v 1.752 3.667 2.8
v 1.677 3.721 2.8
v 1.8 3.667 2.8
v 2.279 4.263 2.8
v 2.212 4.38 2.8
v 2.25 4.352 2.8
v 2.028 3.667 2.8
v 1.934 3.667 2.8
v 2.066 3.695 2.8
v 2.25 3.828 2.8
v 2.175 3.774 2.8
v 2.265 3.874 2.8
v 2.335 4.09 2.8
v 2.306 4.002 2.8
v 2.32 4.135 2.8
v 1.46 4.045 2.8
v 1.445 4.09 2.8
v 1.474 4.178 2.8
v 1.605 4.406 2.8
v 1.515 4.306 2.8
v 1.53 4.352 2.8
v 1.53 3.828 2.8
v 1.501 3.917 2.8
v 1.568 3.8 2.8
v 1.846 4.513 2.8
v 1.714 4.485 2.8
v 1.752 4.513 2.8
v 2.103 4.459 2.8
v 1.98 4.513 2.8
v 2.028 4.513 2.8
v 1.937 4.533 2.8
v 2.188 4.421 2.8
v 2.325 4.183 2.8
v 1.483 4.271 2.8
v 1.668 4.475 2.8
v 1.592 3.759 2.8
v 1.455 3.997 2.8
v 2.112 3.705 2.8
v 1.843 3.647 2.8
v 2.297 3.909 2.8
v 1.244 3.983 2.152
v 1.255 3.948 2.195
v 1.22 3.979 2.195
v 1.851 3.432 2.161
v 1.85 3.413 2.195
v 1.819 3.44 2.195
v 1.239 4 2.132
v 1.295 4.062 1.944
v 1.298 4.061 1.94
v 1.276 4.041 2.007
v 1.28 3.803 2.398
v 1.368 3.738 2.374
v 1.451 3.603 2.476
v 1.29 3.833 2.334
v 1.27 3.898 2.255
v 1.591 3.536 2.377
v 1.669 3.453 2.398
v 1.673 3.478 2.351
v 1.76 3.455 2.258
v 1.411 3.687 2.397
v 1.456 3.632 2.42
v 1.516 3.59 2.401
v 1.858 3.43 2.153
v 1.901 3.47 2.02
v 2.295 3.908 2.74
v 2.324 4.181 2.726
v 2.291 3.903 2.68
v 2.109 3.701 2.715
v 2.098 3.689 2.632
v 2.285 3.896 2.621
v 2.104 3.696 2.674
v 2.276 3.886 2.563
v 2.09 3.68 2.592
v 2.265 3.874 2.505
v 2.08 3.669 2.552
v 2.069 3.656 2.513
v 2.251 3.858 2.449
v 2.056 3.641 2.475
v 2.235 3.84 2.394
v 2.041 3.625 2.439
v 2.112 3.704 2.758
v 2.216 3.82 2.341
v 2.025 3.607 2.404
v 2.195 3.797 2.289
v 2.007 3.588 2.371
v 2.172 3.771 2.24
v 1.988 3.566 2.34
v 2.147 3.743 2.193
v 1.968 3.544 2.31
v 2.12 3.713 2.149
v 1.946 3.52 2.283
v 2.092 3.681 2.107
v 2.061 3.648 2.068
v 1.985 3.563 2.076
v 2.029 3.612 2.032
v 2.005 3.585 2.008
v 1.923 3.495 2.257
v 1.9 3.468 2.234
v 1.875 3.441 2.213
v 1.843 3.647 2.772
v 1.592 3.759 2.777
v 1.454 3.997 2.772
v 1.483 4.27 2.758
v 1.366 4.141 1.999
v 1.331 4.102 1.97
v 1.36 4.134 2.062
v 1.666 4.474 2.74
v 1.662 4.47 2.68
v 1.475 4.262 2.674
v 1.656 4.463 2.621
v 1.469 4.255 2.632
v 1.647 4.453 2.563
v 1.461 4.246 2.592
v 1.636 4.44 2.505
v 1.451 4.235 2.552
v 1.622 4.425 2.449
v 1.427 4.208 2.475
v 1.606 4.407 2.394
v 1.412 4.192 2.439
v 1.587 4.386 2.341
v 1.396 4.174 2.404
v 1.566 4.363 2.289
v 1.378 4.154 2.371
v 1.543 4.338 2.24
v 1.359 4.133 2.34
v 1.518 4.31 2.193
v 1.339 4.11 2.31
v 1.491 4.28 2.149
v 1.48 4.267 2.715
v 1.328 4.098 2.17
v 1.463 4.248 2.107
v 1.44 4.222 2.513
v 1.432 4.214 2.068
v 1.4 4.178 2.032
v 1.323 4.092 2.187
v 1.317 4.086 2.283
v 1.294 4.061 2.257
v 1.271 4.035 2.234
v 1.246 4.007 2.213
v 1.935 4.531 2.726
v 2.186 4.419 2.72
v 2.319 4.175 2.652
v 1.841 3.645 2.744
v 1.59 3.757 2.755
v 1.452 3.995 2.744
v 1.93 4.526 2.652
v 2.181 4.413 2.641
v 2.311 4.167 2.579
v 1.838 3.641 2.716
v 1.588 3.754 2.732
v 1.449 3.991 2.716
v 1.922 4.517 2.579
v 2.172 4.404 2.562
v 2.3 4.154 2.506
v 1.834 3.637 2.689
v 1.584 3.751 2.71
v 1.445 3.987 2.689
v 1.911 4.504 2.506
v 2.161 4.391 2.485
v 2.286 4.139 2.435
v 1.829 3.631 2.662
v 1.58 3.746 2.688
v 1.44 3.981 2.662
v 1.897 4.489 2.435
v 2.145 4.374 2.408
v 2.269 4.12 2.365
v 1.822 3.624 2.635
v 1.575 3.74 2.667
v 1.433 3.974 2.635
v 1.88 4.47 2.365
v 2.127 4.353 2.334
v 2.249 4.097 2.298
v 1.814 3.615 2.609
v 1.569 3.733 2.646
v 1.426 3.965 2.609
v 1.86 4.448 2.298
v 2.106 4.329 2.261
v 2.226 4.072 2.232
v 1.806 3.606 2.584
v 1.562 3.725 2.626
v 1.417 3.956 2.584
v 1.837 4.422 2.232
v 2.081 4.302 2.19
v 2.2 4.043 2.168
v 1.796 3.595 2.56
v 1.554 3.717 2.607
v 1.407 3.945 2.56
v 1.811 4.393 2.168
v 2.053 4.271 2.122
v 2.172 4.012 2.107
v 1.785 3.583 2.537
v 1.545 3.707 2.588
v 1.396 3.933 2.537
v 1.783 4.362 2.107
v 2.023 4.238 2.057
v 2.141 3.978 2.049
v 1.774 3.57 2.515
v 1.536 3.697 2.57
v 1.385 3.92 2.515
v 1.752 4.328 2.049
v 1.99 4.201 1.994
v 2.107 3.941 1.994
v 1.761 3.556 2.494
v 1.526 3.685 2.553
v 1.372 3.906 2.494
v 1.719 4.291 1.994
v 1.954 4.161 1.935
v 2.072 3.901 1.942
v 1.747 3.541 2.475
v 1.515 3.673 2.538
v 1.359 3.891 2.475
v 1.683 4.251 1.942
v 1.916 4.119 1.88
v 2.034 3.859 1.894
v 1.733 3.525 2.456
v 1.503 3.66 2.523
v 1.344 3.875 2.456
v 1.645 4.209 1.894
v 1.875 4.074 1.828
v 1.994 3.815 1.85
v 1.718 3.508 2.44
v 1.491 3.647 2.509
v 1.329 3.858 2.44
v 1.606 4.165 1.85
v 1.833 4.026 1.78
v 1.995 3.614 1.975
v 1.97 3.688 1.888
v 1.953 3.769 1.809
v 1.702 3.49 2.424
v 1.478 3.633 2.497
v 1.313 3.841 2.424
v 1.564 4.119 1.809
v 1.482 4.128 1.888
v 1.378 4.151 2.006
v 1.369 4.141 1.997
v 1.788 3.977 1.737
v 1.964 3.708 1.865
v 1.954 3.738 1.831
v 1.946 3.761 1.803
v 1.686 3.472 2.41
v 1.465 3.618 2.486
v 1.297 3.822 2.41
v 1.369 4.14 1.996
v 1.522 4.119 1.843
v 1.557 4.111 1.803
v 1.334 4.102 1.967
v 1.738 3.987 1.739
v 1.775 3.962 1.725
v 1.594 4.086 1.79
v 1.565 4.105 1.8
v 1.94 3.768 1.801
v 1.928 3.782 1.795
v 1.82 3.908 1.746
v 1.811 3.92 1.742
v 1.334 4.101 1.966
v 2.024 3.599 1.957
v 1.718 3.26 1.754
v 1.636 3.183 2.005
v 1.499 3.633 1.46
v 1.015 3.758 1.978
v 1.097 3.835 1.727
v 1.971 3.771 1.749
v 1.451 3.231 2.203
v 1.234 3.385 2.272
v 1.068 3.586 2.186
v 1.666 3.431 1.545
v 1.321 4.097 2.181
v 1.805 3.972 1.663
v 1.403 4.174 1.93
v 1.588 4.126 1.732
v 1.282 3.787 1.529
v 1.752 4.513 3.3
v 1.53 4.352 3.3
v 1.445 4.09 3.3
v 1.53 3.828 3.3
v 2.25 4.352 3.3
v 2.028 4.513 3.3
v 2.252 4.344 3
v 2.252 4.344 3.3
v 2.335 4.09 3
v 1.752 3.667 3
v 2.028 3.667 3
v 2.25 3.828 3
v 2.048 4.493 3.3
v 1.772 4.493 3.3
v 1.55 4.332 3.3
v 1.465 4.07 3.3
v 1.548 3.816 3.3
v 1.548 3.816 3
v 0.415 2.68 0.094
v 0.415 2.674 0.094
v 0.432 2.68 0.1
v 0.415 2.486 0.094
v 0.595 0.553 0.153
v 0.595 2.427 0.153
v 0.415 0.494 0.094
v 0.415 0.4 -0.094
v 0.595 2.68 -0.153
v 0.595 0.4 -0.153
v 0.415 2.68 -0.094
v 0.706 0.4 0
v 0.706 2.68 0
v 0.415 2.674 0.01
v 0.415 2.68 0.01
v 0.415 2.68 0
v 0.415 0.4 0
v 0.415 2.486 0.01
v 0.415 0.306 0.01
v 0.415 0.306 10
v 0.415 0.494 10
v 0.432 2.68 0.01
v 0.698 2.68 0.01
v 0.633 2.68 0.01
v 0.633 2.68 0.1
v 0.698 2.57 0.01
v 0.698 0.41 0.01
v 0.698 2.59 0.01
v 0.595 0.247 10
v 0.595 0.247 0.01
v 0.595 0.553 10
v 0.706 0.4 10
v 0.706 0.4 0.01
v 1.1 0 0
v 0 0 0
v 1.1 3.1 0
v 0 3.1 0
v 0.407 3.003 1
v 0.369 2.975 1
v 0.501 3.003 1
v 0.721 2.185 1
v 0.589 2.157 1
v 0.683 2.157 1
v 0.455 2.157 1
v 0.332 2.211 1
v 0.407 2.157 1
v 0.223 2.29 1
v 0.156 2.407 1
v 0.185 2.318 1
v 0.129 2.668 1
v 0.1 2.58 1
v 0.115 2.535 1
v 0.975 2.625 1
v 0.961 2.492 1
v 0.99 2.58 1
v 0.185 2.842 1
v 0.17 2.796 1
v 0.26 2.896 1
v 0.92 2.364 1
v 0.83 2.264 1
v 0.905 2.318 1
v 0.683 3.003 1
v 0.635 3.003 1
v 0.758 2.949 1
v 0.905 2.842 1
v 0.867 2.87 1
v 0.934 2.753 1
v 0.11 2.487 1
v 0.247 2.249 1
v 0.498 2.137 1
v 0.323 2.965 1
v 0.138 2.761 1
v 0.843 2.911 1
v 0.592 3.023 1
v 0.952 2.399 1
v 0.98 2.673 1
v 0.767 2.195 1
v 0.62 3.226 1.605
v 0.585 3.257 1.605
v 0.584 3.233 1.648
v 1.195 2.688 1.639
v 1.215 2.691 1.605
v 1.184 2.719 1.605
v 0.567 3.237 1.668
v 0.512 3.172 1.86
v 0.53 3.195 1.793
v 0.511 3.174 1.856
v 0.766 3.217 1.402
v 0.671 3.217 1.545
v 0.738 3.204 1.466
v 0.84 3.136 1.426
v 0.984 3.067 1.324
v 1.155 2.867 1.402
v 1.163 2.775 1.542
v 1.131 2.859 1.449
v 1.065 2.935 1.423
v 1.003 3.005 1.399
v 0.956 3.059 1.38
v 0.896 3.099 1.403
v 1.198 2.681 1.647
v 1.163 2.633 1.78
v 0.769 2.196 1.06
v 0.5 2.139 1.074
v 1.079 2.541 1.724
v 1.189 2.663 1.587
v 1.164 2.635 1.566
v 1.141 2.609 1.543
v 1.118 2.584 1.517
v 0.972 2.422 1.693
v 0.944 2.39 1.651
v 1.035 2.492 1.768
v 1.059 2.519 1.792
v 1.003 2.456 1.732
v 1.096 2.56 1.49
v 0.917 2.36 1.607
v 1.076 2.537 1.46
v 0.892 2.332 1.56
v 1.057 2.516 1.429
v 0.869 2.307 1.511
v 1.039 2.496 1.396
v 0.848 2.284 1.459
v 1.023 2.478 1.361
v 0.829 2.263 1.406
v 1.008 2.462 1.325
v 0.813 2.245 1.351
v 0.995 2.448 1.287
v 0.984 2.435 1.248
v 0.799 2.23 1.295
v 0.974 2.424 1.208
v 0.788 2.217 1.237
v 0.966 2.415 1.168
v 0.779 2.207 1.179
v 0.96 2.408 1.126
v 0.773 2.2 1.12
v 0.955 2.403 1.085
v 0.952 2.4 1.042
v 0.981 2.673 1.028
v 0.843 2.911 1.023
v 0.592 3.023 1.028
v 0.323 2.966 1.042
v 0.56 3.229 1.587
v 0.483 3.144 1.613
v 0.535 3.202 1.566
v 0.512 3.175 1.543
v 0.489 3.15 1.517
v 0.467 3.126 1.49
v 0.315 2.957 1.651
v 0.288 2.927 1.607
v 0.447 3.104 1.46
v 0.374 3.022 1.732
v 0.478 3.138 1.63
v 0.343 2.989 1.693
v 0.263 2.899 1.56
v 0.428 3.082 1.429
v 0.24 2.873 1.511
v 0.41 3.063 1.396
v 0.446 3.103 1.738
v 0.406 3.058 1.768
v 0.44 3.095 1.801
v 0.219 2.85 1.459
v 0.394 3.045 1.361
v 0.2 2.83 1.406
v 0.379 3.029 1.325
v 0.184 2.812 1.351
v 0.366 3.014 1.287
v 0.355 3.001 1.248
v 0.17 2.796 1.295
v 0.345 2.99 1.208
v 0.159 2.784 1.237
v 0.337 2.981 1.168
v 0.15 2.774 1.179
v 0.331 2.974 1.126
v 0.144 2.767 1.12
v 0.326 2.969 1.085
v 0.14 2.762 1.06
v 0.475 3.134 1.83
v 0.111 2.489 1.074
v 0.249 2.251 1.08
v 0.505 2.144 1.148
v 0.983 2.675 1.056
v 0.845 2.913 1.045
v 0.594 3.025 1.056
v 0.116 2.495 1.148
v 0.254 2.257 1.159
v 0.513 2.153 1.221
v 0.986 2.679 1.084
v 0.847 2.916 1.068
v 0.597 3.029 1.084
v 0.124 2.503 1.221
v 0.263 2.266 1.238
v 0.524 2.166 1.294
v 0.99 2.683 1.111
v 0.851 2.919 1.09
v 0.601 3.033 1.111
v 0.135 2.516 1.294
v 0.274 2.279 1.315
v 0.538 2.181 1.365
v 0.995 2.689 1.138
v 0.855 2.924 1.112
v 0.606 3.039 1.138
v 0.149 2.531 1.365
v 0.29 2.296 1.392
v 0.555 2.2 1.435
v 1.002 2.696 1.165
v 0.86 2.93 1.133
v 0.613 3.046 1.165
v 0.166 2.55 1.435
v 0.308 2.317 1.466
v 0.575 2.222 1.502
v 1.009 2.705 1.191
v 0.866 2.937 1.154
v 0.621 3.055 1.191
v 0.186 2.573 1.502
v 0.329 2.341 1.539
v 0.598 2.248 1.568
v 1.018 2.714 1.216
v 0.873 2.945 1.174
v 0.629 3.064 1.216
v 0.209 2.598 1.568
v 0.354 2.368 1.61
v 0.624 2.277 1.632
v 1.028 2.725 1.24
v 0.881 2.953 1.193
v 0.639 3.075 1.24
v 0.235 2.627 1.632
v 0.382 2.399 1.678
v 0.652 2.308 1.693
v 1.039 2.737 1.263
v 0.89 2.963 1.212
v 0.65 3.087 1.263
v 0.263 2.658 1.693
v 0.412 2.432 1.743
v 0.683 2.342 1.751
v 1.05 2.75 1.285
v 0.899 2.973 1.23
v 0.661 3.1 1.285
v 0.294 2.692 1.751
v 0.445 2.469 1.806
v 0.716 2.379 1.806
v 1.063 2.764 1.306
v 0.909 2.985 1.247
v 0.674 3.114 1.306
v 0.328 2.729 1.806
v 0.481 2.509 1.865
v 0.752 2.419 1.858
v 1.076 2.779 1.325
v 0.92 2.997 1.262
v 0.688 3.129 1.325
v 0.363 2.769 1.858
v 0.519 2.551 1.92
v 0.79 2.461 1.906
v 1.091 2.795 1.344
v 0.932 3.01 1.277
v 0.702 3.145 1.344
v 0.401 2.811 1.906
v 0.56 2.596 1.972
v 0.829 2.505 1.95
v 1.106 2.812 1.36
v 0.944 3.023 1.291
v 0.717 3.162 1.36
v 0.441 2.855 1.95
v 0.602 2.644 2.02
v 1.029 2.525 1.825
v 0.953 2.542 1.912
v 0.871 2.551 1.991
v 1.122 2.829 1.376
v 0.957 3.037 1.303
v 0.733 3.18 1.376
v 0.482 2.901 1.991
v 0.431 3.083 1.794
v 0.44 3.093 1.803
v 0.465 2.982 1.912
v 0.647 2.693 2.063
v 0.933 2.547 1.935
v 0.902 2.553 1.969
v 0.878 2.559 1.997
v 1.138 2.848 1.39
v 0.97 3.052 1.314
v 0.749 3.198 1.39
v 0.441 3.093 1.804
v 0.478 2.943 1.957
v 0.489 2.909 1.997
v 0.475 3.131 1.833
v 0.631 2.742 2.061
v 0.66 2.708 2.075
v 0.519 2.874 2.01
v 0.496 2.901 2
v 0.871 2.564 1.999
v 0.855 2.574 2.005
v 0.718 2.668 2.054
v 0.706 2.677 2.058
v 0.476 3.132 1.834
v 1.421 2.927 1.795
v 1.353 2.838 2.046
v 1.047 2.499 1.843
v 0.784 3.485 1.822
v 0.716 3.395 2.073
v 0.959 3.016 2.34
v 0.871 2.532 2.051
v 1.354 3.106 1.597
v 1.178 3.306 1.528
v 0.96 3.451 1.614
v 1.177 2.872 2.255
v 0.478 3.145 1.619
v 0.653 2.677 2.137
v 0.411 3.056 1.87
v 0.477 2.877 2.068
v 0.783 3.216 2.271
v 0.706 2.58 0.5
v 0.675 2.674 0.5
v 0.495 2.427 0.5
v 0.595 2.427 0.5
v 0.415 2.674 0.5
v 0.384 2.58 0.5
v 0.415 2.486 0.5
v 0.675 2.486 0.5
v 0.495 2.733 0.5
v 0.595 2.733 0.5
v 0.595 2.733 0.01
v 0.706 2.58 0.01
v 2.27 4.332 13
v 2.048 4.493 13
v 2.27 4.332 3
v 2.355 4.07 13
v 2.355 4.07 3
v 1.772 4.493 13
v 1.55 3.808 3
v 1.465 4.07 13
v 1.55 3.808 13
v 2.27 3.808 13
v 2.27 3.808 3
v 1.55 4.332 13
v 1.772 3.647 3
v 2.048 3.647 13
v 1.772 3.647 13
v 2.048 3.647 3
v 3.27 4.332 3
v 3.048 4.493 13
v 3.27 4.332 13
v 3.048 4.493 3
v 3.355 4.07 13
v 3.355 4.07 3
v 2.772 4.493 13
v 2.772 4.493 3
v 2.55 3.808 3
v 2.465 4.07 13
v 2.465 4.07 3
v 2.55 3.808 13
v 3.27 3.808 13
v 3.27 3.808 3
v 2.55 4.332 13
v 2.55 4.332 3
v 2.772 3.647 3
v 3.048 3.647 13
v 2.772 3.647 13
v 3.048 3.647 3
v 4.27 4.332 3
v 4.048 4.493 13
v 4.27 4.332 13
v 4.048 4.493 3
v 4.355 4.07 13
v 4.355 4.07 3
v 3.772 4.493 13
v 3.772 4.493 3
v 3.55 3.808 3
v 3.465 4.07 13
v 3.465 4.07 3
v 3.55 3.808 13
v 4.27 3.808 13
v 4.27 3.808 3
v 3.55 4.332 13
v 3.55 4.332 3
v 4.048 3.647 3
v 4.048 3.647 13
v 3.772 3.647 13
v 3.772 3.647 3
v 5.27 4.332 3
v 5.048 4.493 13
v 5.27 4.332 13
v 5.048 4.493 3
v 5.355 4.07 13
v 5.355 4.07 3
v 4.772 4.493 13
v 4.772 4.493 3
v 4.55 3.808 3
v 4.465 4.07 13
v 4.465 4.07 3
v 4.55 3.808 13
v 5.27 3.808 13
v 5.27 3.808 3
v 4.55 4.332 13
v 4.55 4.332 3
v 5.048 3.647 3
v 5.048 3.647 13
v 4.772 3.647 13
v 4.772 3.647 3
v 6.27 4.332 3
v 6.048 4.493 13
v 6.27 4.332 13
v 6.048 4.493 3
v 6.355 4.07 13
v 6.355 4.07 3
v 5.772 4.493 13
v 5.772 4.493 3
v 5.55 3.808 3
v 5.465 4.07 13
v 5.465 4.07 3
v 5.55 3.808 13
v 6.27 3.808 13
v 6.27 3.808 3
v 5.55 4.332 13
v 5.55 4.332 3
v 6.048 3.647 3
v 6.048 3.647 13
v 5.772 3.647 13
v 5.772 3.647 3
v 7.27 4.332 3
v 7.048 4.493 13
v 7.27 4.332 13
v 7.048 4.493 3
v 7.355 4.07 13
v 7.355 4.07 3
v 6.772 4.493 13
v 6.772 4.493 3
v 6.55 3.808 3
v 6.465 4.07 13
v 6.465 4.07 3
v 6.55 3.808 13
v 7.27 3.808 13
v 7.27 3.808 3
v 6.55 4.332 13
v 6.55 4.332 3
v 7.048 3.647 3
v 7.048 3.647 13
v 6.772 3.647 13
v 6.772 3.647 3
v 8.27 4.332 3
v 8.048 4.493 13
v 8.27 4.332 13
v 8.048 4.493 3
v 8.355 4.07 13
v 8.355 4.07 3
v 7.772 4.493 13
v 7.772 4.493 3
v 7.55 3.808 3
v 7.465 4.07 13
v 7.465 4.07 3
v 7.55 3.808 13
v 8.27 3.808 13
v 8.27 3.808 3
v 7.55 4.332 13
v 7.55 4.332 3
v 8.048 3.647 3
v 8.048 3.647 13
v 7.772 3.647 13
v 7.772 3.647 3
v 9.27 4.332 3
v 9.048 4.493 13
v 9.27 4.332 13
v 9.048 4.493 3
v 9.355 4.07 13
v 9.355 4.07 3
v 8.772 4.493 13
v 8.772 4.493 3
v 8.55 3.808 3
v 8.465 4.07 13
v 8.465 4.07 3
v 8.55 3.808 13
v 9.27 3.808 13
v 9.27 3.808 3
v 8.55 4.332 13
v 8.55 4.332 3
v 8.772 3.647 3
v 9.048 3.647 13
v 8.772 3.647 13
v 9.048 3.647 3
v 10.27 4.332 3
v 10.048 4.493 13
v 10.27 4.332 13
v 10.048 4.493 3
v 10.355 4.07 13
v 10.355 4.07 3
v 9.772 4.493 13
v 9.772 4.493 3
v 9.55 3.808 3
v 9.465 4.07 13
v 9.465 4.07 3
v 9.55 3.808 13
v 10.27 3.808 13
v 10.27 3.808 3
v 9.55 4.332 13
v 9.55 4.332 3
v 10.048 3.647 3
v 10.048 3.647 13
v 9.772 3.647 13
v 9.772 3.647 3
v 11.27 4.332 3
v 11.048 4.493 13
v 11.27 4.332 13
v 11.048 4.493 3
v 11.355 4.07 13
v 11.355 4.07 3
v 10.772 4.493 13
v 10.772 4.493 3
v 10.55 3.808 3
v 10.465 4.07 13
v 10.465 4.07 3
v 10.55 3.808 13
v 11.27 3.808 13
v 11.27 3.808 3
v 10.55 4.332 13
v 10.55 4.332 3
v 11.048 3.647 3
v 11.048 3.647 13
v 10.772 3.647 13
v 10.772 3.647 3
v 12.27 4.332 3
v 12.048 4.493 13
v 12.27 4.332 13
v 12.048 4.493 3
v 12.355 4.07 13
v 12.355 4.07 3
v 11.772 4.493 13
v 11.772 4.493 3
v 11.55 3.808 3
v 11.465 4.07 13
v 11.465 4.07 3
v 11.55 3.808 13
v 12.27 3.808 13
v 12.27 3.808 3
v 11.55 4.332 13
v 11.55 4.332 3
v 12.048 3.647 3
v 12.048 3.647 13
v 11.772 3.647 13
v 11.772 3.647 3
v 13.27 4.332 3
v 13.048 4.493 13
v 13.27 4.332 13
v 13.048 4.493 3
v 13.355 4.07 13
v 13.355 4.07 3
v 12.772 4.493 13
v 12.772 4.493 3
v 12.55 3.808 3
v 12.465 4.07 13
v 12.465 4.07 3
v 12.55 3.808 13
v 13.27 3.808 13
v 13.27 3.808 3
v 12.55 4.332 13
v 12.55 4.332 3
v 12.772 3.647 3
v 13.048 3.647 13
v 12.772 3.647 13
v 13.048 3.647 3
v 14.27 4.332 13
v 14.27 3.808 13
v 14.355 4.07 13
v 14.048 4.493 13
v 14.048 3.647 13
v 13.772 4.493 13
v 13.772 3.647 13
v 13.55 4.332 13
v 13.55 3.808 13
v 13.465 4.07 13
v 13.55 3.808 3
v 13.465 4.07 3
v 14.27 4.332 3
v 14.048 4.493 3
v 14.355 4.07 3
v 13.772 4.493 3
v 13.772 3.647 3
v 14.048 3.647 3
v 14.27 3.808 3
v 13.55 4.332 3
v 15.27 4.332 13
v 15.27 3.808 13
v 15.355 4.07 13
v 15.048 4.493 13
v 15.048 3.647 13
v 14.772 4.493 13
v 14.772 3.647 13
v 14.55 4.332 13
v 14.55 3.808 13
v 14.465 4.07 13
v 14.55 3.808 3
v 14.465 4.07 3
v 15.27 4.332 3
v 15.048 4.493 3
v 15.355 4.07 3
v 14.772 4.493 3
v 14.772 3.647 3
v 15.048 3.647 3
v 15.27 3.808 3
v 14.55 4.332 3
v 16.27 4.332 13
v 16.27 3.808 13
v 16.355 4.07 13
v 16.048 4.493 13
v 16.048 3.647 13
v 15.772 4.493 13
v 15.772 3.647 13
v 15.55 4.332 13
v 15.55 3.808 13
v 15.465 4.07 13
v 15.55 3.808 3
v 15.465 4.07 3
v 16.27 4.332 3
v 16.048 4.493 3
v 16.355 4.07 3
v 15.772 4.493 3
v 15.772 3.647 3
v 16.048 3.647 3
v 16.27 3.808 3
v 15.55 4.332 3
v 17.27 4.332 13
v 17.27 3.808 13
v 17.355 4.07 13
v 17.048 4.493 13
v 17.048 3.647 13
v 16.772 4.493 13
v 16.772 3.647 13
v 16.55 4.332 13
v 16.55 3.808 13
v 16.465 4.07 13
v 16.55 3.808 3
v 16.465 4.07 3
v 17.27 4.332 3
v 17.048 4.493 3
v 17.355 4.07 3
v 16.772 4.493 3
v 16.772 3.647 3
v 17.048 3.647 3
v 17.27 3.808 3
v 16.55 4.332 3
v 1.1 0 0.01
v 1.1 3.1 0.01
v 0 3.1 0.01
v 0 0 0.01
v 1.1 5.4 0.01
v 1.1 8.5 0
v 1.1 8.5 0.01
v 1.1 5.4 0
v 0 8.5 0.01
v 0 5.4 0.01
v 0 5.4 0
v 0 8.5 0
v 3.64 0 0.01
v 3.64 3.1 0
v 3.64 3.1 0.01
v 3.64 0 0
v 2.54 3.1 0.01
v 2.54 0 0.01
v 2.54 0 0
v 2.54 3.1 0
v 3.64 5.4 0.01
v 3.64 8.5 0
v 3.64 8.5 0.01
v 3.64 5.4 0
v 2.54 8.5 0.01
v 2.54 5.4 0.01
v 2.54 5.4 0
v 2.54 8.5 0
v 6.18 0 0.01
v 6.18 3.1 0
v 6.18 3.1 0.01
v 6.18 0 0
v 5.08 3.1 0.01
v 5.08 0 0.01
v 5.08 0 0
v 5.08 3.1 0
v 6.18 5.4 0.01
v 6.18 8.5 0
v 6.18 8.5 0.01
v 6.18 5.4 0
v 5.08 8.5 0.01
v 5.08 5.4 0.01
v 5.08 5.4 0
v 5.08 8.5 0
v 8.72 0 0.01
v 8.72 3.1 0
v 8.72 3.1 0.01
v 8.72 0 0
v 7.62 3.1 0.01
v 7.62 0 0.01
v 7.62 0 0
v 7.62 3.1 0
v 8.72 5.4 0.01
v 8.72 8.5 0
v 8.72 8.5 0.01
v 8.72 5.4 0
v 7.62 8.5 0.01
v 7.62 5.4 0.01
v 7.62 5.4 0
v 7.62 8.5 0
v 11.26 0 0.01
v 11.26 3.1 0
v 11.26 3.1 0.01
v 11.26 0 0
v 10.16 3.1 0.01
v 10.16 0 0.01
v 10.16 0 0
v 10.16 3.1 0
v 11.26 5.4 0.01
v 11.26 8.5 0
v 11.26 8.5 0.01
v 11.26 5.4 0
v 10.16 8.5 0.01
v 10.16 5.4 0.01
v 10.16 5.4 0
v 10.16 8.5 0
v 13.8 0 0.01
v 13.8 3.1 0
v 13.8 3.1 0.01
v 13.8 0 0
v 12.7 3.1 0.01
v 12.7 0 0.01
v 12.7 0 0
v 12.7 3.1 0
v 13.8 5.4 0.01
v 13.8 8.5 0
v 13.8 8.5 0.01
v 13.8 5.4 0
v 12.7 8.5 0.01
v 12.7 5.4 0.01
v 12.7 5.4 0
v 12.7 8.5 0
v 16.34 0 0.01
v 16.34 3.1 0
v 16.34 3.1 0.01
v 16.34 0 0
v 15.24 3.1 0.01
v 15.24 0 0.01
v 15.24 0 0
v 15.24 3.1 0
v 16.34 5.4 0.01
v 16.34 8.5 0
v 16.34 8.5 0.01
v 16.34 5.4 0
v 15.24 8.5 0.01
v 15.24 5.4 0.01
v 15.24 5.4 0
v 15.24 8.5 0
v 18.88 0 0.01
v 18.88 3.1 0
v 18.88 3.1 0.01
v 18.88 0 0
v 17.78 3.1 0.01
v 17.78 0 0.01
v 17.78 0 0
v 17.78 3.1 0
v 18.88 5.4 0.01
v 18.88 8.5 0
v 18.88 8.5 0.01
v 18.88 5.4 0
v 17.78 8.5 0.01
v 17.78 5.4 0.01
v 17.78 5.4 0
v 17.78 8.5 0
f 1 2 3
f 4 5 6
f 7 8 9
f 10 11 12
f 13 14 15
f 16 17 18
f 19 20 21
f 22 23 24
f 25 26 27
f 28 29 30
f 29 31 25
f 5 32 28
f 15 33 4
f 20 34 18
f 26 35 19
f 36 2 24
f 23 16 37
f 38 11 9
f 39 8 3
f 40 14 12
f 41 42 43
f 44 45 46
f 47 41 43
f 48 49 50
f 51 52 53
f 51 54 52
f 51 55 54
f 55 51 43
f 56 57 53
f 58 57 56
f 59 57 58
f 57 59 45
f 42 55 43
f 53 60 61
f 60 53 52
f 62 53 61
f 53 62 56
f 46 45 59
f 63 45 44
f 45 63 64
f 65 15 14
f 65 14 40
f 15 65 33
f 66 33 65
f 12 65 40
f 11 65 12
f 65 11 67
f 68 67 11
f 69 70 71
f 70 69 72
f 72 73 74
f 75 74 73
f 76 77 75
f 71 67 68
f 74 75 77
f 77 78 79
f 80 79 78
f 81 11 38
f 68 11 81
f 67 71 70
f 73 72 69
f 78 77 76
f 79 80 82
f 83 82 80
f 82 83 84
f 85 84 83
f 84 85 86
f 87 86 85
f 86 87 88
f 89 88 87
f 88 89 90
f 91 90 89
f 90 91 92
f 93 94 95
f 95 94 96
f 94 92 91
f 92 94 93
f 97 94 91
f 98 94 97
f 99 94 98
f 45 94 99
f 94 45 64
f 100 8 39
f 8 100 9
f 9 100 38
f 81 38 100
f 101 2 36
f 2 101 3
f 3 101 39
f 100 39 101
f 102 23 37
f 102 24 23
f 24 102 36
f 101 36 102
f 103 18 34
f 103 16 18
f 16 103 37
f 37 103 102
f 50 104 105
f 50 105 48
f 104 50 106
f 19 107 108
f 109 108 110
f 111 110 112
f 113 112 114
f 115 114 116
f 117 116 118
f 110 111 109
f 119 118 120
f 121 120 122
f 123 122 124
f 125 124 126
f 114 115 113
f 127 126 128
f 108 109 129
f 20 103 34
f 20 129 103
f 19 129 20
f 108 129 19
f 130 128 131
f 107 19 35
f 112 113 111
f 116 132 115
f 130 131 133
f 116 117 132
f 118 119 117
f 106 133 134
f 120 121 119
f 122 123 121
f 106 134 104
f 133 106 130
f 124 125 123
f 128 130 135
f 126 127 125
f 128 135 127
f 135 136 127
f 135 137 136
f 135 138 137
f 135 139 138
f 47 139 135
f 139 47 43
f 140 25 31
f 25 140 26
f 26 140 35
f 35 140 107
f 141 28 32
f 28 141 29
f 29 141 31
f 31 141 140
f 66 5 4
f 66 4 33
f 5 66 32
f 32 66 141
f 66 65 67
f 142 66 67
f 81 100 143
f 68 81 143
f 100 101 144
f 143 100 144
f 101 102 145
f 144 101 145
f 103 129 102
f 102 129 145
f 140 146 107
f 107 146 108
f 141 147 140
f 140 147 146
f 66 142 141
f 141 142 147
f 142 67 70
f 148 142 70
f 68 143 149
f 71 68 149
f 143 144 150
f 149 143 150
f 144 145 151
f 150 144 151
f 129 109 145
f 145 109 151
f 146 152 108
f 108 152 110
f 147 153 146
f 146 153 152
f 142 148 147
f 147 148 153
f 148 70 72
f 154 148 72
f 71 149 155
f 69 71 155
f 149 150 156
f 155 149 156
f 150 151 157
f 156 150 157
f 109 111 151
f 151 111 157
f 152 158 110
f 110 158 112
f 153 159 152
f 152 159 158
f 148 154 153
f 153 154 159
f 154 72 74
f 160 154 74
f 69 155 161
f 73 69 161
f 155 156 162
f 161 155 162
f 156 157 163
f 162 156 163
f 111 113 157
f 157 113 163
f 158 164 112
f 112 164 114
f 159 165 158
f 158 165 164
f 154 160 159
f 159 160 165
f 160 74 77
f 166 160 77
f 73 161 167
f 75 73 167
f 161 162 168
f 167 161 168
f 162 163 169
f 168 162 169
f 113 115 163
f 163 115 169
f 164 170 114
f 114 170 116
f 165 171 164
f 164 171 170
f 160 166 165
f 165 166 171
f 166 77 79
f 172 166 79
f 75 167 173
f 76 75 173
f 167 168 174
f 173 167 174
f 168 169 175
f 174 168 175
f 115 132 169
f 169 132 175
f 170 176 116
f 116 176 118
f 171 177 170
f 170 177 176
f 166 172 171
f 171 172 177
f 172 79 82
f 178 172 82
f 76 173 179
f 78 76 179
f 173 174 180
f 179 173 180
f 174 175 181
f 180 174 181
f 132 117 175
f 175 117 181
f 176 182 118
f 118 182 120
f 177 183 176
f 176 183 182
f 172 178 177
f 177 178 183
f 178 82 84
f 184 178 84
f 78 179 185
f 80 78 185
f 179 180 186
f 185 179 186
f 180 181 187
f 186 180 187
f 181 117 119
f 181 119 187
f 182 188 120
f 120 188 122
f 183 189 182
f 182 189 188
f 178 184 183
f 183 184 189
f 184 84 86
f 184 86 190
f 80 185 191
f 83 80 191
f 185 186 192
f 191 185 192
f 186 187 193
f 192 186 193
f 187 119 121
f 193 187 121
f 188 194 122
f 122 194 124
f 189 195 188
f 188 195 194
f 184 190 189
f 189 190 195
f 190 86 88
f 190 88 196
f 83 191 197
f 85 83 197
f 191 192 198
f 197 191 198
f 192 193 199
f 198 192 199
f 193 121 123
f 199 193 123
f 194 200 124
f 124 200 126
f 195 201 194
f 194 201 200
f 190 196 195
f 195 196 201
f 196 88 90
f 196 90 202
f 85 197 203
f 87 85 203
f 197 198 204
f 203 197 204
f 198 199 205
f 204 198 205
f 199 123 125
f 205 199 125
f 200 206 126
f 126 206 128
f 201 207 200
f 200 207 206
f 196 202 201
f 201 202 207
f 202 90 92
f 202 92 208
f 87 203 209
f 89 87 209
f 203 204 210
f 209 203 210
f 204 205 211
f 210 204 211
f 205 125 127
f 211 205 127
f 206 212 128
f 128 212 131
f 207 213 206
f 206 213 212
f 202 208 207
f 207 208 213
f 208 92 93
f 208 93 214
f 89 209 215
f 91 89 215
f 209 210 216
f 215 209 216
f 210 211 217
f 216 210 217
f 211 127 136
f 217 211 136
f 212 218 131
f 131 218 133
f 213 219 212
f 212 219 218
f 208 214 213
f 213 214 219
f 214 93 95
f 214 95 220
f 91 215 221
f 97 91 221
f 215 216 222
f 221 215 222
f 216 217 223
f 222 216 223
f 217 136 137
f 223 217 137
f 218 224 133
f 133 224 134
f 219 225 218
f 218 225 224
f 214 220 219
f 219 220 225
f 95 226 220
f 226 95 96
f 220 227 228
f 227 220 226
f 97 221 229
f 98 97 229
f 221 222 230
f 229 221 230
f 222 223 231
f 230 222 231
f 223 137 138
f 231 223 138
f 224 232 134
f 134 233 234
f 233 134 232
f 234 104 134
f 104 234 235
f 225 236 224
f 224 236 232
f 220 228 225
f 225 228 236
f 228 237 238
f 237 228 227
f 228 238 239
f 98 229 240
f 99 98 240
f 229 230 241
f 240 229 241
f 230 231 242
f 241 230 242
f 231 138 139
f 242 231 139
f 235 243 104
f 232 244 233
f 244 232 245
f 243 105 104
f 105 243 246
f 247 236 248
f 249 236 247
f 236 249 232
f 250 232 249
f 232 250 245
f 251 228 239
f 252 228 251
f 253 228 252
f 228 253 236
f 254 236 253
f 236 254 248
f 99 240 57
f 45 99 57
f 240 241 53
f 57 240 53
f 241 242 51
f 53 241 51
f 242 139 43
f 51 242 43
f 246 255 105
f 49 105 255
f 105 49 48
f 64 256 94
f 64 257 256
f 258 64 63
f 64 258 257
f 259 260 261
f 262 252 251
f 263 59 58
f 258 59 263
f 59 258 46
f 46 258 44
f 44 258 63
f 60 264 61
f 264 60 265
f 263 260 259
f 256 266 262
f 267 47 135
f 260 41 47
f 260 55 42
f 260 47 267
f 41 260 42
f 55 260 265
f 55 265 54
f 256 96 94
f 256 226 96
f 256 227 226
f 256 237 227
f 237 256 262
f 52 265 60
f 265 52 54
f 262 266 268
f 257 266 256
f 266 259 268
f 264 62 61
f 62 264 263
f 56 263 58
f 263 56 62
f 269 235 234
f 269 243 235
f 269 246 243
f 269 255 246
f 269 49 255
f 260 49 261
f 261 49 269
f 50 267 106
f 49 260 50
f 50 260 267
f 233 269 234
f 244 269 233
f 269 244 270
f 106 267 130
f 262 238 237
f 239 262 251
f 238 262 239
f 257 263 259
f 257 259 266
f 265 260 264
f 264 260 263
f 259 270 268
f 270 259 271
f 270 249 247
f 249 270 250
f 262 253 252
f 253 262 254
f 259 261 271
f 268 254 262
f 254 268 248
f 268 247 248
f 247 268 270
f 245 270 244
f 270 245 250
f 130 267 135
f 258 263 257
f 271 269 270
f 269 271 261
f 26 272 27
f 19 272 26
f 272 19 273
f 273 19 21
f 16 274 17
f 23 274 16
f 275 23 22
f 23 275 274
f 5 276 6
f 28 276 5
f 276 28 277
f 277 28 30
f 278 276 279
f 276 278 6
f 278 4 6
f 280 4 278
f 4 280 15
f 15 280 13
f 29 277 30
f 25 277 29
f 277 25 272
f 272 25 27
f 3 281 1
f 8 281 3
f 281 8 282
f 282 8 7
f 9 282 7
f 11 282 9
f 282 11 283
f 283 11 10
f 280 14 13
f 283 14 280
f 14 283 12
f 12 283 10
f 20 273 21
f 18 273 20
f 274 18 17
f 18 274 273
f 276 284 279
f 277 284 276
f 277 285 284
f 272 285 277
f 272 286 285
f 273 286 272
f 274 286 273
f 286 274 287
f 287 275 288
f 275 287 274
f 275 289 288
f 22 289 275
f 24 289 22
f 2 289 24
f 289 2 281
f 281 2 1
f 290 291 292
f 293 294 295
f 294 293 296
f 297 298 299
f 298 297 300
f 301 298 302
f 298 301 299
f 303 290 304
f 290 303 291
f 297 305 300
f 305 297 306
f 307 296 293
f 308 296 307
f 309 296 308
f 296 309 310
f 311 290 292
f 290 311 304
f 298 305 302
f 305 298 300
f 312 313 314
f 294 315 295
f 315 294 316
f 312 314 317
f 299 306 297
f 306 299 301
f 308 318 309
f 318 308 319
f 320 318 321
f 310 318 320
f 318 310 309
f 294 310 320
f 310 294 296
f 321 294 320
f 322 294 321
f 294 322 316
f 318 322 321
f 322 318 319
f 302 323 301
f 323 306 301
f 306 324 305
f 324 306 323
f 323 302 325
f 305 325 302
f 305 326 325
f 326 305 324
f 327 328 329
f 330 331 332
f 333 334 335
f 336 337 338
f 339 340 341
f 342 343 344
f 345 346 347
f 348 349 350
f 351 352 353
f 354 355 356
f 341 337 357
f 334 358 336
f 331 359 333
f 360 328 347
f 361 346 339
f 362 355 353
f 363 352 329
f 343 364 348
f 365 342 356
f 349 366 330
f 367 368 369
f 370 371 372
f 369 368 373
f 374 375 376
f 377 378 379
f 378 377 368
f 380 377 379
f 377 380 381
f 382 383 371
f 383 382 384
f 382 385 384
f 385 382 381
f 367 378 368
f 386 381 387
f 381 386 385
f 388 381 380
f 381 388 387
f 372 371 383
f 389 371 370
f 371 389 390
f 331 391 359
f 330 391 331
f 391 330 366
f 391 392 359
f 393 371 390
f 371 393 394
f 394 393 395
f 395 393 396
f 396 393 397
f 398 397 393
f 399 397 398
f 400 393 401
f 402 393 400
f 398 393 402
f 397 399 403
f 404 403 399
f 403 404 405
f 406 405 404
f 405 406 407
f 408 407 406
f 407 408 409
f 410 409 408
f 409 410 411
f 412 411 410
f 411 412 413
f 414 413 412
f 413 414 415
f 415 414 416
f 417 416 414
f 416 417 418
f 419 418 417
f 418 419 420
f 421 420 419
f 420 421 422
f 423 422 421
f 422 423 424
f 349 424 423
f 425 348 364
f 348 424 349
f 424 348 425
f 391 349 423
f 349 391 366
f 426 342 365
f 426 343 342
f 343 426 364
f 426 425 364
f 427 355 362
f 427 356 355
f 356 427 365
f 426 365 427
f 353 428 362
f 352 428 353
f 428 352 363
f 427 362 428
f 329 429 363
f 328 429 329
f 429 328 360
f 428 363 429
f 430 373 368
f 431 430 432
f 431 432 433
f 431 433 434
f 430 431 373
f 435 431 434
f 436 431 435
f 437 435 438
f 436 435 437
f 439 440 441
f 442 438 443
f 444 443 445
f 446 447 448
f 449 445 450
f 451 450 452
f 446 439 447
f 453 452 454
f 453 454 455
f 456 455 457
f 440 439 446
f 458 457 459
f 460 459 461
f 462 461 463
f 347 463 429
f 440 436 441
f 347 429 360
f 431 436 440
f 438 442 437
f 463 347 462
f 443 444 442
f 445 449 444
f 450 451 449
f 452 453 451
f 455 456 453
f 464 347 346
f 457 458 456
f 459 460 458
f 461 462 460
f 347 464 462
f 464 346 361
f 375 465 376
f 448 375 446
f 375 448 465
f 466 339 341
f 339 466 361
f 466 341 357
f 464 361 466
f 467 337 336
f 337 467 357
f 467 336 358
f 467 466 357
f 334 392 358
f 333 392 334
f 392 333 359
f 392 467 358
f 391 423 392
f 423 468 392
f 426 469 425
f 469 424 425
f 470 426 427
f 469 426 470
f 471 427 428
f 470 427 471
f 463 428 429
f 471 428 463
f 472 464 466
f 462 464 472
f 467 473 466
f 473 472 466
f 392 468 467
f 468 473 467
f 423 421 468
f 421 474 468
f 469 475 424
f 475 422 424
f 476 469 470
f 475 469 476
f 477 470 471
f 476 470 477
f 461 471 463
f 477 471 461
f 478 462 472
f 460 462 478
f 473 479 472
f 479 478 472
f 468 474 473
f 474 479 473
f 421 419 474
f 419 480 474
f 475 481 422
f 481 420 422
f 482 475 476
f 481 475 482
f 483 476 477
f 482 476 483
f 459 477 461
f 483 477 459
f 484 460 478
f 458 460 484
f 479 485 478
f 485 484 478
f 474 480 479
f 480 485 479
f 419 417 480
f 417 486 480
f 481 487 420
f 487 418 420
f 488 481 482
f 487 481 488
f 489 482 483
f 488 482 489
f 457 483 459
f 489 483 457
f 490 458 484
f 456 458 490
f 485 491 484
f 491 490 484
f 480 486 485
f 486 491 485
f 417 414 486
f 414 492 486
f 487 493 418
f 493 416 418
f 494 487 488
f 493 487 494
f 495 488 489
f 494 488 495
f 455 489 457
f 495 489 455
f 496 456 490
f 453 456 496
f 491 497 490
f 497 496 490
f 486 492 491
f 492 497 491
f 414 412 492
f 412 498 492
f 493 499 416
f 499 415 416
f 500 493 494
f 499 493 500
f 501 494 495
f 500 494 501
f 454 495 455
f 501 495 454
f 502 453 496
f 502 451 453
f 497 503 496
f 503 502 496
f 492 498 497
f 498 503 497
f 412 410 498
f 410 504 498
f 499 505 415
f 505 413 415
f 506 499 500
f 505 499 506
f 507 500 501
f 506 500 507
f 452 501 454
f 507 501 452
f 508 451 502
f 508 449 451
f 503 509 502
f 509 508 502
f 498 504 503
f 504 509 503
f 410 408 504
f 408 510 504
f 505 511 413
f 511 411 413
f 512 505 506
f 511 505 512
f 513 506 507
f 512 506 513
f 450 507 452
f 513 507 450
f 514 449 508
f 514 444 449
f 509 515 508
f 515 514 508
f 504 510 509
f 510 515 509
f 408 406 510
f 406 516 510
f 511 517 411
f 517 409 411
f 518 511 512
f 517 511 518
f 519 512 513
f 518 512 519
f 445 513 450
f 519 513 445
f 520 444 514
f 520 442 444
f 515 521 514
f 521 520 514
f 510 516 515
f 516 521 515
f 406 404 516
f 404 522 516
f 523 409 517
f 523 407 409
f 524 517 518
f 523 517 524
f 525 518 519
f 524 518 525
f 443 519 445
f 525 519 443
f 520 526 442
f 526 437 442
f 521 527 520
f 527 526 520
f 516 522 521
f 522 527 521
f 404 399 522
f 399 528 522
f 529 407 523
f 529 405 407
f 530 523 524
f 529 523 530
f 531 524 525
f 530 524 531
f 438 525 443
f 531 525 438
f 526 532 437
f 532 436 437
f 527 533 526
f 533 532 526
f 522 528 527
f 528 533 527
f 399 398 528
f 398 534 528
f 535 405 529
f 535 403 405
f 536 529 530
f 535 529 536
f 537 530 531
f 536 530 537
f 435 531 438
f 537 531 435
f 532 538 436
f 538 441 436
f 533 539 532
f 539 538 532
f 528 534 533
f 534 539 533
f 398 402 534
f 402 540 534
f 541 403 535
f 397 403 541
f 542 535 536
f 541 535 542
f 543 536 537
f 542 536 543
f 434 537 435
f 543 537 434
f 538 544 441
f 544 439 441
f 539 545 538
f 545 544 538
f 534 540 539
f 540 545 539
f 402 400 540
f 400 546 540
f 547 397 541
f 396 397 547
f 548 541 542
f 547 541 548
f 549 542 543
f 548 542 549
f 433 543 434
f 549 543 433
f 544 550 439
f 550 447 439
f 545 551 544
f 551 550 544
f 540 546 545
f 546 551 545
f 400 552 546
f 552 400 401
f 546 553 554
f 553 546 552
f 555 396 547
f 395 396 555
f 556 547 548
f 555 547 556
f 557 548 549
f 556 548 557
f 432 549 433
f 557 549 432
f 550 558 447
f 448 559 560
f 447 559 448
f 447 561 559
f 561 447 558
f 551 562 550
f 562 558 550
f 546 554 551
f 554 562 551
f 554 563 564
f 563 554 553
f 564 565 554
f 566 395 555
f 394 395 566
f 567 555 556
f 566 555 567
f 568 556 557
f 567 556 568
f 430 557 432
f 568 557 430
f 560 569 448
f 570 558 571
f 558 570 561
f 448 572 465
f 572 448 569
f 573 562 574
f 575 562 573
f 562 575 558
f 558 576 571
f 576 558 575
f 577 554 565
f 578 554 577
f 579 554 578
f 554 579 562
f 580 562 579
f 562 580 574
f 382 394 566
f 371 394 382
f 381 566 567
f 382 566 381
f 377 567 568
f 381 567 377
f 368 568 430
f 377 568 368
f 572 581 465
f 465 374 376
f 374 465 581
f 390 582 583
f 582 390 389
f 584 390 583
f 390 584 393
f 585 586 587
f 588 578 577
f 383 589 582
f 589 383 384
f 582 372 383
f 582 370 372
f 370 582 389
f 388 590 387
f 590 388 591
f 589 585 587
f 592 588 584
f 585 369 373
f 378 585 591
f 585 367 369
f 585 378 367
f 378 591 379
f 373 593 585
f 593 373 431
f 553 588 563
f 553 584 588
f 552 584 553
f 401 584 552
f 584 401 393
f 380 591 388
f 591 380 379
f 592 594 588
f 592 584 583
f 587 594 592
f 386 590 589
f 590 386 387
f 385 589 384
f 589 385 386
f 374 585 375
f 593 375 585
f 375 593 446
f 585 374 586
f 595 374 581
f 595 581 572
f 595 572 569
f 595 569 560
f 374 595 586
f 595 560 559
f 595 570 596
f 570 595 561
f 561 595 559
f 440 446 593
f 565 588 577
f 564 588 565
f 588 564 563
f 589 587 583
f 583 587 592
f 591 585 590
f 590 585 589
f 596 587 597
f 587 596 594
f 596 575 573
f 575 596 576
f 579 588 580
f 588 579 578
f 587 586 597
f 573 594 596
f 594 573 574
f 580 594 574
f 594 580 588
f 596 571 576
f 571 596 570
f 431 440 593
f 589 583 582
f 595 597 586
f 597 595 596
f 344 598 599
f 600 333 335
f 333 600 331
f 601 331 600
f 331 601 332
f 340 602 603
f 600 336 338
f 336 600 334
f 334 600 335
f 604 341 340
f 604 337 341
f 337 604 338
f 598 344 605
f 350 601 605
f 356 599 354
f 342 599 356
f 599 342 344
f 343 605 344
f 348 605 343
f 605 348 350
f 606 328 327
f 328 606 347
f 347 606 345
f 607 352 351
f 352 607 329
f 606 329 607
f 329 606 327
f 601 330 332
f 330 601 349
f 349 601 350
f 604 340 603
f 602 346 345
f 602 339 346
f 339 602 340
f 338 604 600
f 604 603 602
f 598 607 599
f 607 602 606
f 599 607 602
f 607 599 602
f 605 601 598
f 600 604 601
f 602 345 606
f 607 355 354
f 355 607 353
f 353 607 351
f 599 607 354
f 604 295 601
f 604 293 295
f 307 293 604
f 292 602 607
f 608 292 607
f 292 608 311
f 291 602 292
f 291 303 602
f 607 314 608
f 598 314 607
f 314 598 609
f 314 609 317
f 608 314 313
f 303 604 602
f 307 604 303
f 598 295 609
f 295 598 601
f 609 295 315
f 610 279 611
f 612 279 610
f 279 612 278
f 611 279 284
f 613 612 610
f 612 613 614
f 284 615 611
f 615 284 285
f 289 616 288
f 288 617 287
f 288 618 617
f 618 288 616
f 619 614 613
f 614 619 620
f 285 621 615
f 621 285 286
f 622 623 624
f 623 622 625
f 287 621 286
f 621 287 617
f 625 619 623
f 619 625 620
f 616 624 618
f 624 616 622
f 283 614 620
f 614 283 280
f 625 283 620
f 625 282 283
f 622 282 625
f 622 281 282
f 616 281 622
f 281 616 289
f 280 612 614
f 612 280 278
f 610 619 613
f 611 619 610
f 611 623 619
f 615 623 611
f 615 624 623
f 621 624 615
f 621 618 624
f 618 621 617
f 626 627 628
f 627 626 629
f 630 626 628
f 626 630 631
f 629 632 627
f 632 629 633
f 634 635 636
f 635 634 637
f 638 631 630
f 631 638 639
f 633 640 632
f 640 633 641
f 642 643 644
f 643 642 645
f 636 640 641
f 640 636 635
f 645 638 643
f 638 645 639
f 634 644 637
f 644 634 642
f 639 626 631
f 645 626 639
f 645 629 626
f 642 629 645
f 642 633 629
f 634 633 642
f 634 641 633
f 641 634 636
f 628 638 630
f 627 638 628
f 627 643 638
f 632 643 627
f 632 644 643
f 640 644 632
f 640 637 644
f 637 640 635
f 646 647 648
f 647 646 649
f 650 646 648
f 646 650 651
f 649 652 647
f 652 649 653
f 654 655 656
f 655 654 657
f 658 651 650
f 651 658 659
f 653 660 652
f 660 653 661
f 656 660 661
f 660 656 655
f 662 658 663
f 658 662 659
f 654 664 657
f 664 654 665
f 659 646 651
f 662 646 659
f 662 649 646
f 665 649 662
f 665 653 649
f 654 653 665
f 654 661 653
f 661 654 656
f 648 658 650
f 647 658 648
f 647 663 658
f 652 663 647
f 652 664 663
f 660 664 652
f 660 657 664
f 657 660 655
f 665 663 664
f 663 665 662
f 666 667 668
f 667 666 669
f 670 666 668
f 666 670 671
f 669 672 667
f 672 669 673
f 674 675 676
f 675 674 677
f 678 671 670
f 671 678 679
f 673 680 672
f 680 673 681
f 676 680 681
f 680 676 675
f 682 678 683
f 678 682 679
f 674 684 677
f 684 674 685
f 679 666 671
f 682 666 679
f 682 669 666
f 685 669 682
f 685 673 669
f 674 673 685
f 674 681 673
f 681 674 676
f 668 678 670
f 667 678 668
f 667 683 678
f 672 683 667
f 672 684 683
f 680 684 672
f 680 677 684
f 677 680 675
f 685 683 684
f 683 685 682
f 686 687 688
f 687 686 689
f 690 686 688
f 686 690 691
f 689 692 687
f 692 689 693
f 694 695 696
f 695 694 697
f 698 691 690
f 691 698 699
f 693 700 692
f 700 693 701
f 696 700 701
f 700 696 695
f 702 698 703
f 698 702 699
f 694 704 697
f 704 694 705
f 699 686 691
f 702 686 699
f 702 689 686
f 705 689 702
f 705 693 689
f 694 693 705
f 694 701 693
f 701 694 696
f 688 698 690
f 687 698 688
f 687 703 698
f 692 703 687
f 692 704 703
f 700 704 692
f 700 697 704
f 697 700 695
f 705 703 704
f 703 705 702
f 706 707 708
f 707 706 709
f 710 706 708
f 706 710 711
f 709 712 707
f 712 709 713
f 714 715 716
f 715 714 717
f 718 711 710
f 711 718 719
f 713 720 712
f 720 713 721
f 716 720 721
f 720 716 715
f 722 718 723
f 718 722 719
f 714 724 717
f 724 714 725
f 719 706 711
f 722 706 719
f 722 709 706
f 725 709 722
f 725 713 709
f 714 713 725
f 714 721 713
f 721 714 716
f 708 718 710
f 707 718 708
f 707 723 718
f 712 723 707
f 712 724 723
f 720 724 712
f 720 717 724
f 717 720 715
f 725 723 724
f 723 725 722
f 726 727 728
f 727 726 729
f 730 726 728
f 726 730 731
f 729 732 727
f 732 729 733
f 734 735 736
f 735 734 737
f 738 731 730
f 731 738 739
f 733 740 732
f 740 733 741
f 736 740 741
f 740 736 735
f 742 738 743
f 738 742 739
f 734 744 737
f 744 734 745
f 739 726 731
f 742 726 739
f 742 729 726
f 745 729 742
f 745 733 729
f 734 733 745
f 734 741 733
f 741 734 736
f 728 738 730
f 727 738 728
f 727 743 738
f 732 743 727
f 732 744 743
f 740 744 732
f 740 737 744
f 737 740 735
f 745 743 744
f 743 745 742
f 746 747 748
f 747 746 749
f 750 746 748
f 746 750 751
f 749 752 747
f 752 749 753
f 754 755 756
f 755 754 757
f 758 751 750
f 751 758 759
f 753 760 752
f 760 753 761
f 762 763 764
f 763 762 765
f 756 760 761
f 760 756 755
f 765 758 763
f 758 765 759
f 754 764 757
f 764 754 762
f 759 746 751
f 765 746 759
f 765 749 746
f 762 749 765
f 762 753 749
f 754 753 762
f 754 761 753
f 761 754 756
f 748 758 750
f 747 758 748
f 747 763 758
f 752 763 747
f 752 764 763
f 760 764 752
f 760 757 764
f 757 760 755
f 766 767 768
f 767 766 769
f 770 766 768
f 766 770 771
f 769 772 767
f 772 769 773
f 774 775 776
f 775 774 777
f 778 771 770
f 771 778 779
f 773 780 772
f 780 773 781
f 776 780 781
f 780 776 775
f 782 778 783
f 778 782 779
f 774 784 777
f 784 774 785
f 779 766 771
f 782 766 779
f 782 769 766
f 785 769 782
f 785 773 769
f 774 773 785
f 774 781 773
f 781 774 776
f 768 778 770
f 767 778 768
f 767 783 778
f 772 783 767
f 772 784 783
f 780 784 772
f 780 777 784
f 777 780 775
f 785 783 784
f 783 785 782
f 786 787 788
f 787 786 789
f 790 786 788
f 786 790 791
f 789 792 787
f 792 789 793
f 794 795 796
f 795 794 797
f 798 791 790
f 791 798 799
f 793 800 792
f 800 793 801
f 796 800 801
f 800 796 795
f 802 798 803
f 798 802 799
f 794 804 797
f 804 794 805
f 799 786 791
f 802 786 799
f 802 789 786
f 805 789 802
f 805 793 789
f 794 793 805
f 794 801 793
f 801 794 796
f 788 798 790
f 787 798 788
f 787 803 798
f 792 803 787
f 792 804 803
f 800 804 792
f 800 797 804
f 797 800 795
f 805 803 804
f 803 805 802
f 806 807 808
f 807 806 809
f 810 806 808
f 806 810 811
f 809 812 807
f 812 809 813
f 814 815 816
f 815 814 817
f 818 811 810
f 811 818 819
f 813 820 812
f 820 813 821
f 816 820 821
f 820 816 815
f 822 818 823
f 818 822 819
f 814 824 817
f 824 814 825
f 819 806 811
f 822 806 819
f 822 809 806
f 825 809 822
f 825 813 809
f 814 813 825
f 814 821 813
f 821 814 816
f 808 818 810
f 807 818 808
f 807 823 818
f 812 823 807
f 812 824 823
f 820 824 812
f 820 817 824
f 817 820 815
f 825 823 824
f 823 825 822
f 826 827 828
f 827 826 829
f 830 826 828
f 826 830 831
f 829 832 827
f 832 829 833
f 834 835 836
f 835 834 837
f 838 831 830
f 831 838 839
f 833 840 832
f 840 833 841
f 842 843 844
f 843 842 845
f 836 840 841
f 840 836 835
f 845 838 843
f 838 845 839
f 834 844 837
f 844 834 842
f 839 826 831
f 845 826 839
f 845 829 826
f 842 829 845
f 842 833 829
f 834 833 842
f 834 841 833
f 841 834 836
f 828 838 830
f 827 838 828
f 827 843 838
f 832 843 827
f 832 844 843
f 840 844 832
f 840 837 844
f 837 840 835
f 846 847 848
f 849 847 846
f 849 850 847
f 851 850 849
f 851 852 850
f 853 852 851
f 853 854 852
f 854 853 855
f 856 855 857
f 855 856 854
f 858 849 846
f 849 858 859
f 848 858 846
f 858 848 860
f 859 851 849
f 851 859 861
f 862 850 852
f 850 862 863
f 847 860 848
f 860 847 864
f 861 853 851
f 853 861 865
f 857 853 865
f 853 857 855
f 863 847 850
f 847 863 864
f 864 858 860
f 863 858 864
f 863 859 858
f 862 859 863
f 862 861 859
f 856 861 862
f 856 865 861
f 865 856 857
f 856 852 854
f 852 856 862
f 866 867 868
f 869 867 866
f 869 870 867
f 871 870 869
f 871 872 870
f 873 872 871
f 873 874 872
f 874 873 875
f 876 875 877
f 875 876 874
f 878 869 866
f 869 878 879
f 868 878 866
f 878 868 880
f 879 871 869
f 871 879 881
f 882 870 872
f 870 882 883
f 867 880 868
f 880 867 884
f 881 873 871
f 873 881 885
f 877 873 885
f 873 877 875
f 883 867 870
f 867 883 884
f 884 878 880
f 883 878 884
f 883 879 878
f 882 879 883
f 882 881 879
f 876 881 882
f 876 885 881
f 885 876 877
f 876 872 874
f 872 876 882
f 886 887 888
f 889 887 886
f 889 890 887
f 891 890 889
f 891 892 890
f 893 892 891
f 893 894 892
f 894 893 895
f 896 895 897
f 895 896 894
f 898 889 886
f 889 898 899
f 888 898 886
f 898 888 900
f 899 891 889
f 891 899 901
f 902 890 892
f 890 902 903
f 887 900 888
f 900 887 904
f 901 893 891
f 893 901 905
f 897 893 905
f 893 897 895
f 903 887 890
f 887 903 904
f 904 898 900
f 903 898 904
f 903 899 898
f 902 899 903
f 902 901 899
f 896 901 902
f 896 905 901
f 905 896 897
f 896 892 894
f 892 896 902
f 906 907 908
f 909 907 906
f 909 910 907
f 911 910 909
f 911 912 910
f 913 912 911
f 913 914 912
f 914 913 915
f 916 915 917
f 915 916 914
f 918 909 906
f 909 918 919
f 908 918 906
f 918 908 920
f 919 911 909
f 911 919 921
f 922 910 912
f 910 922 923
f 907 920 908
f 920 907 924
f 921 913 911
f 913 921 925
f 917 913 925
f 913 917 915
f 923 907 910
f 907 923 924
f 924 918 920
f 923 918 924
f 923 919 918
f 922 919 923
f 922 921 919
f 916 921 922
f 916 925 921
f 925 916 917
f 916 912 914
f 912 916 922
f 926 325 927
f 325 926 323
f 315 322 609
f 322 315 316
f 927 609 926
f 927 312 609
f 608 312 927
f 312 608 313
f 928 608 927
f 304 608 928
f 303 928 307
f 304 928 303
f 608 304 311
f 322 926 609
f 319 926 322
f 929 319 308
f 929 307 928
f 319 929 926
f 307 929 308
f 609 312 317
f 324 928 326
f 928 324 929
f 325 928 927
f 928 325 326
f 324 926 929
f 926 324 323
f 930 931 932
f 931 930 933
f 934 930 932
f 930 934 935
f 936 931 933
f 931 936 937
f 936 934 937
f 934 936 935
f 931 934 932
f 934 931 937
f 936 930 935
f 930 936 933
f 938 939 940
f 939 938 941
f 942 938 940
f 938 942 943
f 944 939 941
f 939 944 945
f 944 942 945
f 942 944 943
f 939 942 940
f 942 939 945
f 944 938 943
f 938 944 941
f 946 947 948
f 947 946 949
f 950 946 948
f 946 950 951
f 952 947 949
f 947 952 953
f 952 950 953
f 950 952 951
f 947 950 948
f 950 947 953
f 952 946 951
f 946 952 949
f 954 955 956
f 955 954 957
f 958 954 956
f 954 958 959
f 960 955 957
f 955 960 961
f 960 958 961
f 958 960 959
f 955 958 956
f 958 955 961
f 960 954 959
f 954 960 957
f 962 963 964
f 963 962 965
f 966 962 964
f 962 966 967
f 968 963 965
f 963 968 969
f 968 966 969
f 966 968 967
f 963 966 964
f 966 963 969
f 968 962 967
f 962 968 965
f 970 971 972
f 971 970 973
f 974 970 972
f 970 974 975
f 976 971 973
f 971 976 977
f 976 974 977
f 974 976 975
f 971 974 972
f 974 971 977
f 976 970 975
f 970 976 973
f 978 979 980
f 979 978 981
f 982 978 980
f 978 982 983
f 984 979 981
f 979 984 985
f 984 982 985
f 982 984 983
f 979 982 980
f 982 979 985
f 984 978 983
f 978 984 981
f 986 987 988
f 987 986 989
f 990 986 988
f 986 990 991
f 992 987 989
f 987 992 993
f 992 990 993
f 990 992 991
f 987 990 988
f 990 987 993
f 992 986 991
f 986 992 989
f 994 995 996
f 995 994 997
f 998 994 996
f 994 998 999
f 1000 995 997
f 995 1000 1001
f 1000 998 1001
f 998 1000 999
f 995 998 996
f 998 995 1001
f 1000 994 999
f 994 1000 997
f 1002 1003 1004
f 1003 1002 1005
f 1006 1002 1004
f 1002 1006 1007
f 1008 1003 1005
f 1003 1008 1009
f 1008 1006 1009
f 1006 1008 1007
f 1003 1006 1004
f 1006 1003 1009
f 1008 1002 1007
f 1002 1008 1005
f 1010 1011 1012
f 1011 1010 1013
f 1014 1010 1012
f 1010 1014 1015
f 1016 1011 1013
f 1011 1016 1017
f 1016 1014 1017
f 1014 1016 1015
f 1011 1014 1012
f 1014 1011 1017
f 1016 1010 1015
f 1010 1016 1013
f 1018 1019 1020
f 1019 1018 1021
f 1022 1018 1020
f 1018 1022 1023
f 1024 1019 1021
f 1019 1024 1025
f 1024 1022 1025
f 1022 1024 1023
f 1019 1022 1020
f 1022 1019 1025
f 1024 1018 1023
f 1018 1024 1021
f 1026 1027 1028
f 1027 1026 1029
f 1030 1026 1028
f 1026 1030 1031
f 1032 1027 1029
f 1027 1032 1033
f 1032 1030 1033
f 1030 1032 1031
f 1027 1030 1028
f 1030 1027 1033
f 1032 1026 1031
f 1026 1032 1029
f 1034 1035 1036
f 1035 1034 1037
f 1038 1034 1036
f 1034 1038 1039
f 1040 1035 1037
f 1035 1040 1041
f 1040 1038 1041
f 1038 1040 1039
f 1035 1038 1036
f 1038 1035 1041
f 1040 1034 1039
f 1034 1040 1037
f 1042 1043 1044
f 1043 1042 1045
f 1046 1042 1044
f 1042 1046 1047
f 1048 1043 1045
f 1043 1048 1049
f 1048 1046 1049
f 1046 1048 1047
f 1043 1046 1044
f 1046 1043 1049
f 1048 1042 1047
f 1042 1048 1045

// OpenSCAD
/* Globals */
pad_width=1.09;
pad_heigt=3.08;
pad_spacing=5.04;


/* bends(70,0.8,3); */

pin();

translate([-15,0,0])
%cube([50,10,5]);

/* Cable */
translate([18.88/2,8.14/2,3])
{
    cable(16);
}
/* Footprint */
footprint(8);
/* The pcb */
/* pcb(); */




/* Modules in the project */
module pin()
{
    /* create a cylider alonge the pad that is 28 avg = diametr of 0.3211mm */
    avgr = 0.3211/2;
    bend_angle=66;
    bend_rotation=42;
    /* Cable dummy */
    translate([pad_width + 0.8,pad_spacing-0.95,2.8])
    {
        cylinder(h=0.5,r1=0.89/2,r2=0.89/2, $fn=10);
        rotate([-180,0,-bend_rotation])
        bends(bend_angle,0.8,0.5);
    }
    /* On pand cable */
    translate([pad_width/2,0.4,0])
    {
        rotate([-90,0,0])
        {
            cylinder(h=pad_heigt-0.8,r1=avgr,r2=avgr);
        }
        cylinder(h=10,r1=avgr,r2=avgr);
    }
    /* Rise from pad to corn */
    translate([pad_width/2,pad_heigt - 0.5,0])
    {
        cylinder(h=0.5,r1=avgr,r2=avgr);
    }
    /* Trat */
    translate([pad_width/2,pad_heigt - 0.5,0.5])
    {
        cylinder(h=0.5,r1=avgr,r2=0.89/2,$fn=10);
        rotate([0,0,-bend_rotation])
            translate([0,0,0.5])
                bends(bend_angle, 0.8, 0.5);
    }

}

module bends(angle, radius, endpipe_length)
{
    /* The bend it self */
    rotate([90,0,-90])
    {
        translate([-radius,0,0])
        {
            rotate_extrude(angle=angle, convexity=30, $fn=100)
                translate([radius, 0, 0])
                circle(r = 0.89/2,$fn=10);
        }
    }
    /* Add the endpipe_length to the bend. */
    /* rotate([-angle,0,0]) */
    /*     translate([0, -cos(angle)*radius,sin(angle)*radius]) */
    translate([0,radius*cos(angle),radius*sin(angle)])
        rotate([-angle,0,0])
            rotate([0,0,20])
            cylinder(h=endpipe_length,r=0.89/2,$fn=10);
}


module cable(n)
{
    /* separation = 1.27; */
    /* stepping = [ for (i = [0 : separation : separation*(n- 1)]) i ]; */
    /* echo(separation) */
    translate([-(n-1)/2-0.3,0,0])
    color("SlateGray",0.8)
    {
        for(i = [0:n-1])
        {
            translate([i + 0.27,0,0])
            {
                cylinder(h=10,r1=0.89/2,r2=0.89/2, $fn=10);
            }
        }
    }
}


module pcb()
{
    width = 91.19;
    height = 78.74;
    /* PCB*/
    translate([-43.90,19.33,0])
    {
        translate([0,-height,-0.8])
            cube([width,height,0.8]);
    }
}

module footprint(rows)
{
    stepping = [ for (i = [0 : 2.54 : 2.54*(rows - 1)]) i ];
    echo(stepping);
    color("Silver",1.0)
    {
        for(i = [0:rows])
        {
            translate([stepping[i],0,0])
            {
                cube([1.10,3.10,0.01]);
                translate([0,5.4,0])
                {
                    cube([1.10,3.10,0.01]);
                }
            }
        }
    }
}
